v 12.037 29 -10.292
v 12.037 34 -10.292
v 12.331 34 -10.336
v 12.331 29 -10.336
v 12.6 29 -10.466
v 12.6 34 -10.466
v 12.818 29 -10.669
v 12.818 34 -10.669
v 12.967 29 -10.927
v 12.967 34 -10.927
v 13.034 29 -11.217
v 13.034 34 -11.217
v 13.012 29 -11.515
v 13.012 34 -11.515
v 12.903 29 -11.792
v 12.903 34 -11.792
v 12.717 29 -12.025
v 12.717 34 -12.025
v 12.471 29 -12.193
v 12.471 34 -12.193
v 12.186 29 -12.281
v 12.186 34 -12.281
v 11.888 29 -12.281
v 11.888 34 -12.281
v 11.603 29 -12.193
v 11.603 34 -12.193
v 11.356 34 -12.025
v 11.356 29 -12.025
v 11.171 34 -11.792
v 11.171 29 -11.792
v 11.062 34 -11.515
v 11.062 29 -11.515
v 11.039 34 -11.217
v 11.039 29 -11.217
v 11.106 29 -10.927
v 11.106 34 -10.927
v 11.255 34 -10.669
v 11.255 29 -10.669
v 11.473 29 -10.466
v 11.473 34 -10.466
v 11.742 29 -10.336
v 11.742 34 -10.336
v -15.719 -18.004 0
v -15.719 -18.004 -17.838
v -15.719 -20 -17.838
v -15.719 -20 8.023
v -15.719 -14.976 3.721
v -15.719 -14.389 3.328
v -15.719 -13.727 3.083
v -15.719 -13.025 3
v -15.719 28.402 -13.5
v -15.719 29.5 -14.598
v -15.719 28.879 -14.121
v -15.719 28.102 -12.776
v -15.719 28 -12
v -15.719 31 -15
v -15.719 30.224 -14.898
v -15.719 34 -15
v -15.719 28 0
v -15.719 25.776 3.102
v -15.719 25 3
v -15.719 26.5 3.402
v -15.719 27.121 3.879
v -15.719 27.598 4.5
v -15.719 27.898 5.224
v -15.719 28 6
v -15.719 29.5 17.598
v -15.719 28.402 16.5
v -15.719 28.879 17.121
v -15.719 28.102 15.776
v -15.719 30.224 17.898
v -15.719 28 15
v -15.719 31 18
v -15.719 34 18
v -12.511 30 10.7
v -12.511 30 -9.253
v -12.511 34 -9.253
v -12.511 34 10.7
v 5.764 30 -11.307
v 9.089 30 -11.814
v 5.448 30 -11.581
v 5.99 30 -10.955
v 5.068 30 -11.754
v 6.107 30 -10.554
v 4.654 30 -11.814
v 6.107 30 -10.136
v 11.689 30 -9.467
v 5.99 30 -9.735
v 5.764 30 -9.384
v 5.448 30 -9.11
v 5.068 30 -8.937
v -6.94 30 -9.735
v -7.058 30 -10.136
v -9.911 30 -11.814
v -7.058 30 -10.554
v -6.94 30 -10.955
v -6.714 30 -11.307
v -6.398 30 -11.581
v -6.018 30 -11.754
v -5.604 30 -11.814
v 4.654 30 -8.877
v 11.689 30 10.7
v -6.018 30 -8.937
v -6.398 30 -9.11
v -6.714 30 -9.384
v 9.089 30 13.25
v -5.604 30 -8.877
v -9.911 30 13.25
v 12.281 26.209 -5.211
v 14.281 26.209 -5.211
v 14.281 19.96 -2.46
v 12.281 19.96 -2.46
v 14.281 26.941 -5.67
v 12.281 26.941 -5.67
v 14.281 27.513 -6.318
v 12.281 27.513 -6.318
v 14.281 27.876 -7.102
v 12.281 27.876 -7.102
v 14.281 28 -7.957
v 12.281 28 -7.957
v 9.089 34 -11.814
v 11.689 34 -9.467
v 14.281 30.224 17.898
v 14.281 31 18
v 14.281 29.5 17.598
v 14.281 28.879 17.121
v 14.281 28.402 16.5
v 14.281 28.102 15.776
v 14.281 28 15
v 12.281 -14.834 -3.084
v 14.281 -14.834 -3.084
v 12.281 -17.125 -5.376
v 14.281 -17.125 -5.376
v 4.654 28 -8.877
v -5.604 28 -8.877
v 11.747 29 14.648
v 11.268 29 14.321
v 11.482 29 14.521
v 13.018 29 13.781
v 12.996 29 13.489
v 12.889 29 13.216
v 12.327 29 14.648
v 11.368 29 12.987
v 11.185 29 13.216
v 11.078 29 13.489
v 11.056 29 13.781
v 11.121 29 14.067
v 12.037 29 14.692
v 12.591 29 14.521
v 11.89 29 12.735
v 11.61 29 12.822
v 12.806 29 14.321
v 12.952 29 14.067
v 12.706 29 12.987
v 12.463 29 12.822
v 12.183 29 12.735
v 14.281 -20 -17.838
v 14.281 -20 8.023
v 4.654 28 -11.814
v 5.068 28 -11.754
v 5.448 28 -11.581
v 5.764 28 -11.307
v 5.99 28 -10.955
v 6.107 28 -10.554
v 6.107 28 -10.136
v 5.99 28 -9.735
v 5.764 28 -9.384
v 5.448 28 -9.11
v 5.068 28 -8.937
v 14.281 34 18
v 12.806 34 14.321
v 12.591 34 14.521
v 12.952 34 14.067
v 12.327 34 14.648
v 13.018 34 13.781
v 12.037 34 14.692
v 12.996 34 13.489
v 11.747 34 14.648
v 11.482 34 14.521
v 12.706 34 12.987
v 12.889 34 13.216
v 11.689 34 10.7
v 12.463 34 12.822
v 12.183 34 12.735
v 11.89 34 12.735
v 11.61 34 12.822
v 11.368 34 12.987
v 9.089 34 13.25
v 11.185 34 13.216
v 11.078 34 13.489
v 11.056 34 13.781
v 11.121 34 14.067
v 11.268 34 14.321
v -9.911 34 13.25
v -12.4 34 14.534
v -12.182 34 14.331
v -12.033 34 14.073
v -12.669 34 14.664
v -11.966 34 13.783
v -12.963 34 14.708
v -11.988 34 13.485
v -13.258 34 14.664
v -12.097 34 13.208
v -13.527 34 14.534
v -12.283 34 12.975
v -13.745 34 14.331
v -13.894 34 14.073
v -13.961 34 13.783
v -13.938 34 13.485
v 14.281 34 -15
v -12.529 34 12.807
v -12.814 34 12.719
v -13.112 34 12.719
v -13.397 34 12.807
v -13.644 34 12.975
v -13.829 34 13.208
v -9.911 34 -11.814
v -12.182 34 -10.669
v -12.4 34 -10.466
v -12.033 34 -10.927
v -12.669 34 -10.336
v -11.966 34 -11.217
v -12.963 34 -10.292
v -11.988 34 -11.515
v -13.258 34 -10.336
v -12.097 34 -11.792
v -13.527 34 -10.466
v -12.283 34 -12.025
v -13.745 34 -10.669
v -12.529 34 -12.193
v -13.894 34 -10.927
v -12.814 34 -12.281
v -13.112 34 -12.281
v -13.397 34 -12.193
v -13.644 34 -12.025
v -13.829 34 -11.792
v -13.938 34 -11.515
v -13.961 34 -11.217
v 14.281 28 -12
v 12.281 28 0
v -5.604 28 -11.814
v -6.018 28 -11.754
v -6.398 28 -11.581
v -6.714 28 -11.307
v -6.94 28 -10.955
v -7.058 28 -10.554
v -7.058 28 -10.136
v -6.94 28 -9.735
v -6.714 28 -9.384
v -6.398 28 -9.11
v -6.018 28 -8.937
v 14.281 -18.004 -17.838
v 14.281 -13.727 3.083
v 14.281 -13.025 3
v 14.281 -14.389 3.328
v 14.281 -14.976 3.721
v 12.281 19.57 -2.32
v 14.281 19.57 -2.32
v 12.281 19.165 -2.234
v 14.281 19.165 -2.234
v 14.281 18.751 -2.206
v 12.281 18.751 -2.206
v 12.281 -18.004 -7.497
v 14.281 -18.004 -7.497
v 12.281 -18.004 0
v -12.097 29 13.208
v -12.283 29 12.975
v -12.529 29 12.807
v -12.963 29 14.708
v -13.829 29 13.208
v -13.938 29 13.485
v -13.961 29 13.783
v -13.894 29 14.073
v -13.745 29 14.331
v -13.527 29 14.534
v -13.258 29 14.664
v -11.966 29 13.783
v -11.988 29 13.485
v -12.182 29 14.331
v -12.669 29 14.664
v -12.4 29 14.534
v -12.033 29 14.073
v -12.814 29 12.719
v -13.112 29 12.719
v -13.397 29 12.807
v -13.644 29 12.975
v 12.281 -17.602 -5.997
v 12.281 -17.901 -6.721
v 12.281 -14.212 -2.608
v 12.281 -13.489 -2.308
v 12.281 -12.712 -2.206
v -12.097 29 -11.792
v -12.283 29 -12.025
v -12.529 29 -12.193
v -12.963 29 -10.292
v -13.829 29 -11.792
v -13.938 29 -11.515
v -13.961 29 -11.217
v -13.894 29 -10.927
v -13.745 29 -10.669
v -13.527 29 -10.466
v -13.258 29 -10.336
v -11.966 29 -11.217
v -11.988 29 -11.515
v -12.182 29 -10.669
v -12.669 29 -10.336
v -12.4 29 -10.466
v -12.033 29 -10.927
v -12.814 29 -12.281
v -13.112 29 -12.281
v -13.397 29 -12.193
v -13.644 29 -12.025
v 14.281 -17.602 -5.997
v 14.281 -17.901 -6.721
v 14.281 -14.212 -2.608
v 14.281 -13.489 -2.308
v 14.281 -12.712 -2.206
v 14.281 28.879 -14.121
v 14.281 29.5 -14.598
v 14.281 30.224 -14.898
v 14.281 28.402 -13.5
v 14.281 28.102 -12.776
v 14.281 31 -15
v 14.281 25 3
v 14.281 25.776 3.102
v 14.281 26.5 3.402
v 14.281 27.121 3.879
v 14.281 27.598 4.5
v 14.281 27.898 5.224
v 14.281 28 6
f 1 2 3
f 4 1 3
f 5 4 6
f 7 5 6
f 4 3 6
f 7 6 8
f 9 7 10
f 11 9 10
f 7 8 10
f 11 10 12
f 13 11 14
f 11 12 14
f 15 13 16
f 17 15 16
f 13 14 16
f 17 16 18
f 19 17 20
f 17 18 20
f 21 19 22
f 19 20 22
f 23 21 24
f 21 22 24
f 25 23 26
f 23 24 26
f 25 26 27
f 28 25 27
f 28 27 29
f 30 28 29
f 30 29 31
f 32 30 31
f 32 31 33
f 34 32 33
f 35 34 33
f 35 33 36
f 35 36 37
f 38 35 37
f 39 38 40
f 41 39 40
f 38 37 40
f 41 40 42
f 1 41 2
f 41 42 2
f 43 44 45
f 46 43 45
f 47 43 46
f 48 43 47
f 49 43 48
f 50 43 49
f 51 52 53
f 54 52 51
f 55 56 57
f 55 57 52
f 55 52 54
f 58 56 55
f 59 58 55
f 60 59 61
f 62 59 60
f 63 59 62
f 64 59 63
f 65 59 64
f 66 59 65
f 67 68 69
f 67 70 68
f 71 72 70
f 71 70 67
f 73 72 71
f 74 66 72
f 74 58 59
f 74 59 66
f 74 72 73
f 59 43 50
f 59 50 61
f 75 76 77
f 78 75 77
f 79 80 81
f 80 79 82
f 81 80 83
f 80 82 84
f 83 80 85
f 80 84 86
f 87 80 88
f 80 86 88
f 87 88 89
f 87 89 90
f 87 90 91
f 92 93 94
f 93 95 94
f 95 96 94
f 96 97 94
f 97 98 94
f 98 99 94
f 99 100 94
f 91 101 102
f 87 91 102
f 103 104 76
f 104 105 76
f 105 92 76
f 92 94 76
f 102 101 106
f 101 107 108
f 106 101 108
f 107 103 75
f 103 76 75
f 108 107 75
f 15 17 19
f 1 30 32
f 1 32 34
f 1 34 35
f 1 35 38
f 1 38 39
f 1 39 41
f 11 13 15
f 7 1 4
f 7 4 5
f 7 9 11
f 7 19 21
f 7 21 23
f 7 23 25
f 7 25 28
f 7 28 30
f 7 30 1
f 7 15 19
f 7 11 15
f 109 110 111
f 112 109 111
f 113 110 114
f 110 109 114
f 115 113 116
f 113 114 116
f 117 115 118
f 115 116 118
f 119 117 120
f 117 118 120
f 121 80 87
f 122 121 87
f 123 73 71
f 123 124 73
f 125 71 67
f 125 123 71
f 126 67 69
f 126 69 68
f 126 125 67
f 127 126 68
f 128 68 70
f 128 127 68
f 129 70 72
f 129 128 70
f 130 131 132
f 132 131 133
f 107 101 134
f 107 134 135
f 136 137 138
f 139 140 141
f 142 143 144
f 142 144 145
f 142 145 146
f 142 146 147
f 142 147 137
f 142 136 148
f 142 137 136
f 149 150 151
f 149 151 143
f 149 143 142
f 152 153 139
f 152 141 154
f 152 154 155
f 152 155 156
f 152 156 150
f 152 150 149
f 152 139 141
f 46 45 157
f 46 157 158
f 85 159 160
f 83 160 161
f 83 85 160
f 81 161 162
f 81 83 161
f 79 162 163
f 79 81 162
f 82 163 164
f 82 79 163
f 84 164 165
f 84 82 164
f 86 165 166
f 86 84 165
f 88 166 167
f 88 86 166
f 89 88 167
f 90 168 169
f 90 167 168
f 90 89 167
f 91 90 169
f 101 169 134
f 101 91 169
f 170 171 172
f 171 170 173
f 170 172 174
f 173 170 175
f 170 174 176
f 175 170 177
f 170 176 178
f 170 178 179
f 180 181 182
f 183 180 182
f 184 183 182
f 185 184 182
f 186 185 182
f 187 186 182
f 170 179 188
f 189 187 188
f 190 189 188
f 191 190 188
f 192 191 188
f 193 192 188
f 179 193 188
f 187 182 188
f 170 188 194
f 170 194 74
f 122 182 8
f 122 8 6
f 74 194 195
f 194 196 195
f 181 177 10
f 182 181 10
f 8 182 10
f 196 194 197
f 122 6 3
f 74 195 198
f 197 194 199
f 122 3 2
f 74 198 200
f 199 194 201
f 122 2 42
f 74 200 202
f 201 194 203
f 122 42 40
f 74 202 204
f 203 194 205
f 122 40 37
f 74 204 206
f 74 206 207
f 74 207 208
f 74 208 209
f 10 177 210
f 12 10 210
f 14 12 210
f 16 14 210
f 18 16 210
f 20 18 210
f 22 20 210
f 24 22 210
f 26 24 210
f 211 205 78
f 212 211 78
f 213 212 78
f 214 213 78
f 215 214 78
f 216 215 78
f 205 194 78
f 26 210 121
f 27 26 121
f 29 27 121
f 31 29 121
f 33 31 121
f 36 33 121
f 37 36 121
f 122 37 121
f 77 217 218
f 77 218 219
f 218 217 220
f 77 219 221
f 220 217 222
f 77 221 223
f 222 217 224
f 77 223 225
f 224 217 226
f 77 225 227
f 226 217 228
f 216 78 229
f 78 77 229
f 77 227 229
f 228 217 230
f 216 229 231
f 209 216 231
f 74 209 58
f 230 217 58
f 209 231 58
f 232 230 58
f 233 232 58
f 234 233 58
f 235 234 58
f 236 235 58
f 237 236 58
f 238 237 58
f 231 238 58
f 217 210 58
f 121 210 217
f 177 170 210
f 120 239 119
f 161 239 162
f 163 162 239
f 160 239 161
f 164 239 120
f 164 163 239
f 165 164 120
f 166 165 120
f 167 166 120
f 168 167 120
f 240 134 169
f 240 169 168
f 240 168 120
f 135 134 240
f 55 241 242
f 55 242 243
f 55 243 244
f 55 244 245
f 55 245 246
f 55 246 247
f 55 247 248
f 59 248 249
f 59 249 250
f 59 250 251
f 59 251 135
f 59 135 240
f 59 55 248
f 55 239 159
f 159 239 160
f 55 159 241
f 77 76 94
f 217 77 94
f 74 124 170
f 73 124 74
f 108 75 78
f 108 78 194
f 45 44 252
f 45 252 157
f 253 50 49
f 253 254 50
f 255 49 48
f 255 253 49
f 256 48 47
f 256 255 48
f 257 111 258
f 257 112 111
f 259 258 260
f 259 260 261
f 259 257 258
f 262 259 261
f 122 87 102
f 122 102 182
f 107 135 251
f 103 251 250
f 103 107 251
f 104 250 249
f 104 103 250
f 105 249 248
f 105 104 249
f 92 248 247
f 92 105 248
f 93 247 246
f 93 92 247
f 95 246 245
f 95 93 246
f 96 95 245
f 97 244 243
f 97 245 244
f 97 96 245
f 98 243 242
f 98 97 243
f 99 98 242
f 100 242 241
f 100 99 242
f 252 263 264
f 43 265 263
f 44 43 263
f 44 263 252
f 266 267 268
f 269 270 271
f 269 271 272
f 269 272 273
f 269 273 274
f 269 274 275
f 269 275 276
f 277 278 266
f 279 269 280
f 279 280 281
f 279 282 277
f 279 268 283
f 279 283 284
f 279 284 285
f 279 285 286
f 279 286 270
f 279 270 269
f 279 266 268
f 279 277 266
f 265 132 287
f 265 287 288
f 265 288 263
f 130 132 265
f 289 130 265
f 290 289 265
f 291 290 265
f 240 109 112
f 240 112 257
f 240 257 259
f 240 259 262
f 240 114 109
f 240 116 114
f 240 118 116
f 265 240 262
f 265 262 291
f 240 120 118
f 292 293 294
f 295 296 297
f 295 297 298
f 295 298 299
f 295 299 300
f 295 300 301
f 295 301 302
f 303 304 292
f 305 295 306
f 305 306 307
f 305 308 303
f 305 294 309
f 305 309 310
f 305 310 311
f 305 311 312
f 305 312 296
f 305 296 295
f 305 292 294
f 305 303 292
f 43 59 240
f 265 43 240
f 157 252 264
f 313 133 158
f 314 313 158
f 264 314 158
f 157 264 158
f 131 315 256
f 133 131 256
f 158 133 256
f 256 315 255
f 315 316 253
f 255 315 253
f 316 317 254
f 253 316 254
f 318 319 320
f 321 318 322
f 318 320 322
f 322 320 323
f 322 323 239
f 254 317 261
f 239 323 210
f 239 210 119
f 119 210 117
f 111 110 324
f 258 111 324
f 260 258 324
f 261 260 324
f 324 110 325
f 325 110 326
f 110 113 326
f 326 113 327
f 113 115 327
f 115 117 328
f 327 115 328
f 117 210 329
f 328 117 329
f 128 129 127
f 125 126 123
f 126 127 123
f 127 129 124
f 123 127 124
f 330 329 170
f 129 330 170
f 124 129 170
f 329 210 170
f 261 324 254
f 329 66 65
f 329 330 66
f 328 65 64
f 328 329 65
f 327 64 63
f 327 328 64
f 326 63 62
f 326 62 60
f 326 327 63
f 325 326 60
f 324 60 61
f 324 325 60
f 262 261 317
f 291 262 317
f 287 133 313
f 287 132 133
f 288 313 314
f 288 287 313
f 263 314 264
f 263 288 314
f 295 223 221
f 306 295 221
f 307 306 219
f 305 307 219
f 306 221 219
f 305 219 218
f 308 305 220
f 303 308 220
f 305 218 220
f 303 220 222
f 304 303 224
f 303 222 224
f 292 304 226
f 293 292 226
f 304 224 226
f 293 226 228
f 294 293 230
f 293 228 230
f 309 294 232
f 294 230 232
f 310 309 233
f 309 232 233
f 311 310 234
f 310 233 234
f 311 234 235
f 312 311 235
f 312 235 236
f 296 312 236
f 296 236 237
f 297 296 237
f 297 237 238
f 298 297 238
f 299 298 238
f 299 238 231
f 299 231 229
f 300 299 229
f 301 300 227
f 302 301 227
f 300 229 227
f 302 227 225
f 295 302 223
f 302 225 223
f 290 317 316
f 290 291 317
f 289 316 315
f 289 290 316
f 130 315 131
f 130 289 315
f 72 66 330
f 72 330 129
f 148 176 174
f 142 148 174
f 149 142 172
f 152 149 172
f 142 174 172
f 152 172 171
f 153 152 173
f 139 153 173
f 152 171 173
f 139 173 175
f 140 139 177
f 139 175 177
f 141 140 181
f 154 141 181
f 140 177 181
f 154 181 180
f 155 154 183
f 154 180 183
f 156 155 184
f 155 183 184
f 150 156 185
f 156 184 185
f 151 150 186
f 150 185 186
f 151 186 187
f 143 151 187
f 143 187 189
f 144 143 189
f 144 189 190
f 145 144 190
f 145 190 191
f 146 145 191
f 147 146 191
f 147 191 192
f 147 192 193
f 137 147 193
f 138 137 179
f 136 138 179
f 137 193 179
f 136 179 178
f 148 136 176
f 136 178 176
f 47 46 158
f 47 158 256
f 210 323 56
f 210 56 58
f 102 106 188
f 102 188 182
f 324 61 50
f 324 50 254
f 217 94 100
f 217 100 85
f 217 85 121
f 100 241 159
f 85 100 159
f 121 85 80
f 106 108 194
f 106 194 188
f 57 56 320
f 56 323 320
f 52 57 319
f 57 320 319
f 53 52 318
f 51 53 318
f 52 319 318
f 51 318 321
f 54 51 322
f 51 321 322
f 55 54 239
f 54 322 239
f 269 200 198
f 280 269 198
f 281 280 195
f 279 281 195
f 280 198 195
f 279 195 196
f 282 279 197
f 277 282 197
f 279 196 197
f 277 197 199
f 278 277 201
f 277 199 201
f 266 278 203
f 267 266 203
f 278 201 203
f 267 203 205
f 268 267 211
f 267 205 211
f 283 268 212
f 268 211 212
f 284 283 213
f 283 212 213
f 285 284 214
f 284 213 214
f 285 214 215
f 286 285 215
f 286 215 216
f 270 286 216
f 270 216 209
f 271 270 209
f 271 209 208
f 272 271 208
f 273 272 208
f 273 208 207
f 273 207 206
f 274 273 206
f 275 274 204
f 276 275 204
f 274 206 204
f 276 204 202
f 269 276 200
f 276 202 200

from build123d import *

# Parameters (mm, degrees)
SKETCH_1_W           = 30
SKETCH_1_H           = 50
EXTRUDE_1_DEPTH      = 3
EXTRUDE_2_DEPTH      = 30
EXTRUDE_3_DEPTH      = 15
EXTRUDE_3_DEPTH_BACK = 18
SKETCH_3_W           = 3.207439814
SKETCH_3_H           = 4
SKETCH_3_W_2         = 2.592560186
SKETCH_4_W           = 33
SKETCH_4_H           = 2
EXTRUDE_4_DEPTH      = 30
EXTRUDE_5_DEPTH      = 4
CUT_EXTRUDE_1_DEPTH  = 5
SKETCH_7_R           = 1
SKETCH_7_R_2         = 0.983708166
CUT_EXTRUDE_2_DEPTH  = 5
FILLET_1_R           = 3
FILLET_2_R           = 3
EXTRUDE_6_DEPTH      = 2
FILLET_3_R           = 3
FILLET_4_R           = 3


with BuildPart() as part:
    # 草图1 → 凸台-拉伸1 (new body)
    with BuildSketch(Plane.XY):
        with Locations((-0.718788486, 5)):
            Rectangle(SKETCH_1_W, SKETCH_1_H)
    extrude(amount=EXTRUDE_1_DEPTH)

    # 草图2 → 凸台-拉伸2 (add)
    with BuildSketch(Plane.ZY.offset(15.718788486)):
        Polygon((0, -18.003627417), (-17.838069007, -18.003627417), (-17.838069007, -20), (8.023023193, -20), (3, -14.134137312), align=None)
    extrude(amount=-EXTRUDE_2_DEPTH)

    # 草图3 → 凸台-拉伸3 (add, two sides: drawn at the far end of the back side and taken through both)
    with BuildSketch(Plane.XY.offset(3).offset(-EXTRUDE_3_DEPTH_BACK)):
        with Locations((-14.115068579, 32)):
            Rectangle(SKETCH_3_W, SKETCH_3_H)
        with Locations((12.984931421, 32)):
            Rectangle(SKETCH_3_W_2, SKETCH_3_H)
    extrude(amount=EXTRUDE_3_DEPTH + EXTRUDE_3_DEPTH_BACK)

    # 草图4 → 凸台-拉伸4 (add)
    with BuildSketch(Plane.ZY.offset(15.718788486)):
        with Locations((1.5, 29)):
            Rectangle(SKETCH_4_W, SKETCH_4_H)
    extrude(amount=-EXTRUDE_4_DEPTH)

    # 草图5 → 凸台-拉伸5 (add)
    with BuildSketch(Plane(origin=(0, 30, 0), x_dir=(1, 0, 0), z_dir=(0, 1, 0))):
        Polygon((11.688651328, -18), (-12.511348672, -18), (-12.511348672, -10.700066454), (-9.911348672, -13.250066454), (9.088651328, -13.250066454), (11.688651328, -10.700066454), align=None)
        Polygon((-12.511348672, 15), (-12.511348672, 9.252839713), (-9.911348672, 11.813752042), (9.088651328, 11.813752042), (11.688651328, 9.466986357), (11.688651328, 12.549933546), (11.688651328, 15), align=None)
    extrude(amount=EXTRUDE_5_DEPTH)

    # 草图6 → 切除-拉伸1 (cut)
    with BuildSketch(Plane(origin=(0, 30, 0), x_dir=(1, 0, 0), z_dir=(0, 1, 0))):
        with BuildLine():
            Line((4.654057322, 8.877034891), (-5.604351552, 8.877034891))
            ThreePointArc((-5.604351552, 8.877034891), (-7.072710128, 10.345393466), (-5.604351552, 11.813752042))
            Line((-5.604351552, 11.813752042), (4.654057322, 11.813752042))
            ThreePointArc((4.654057322, 11.813752042), (6.122415898, 10.345393466), (4.654057322, 8.877034891))
        make_face()
    extrude(amount=-CUT_EXTRUDE_1_DEPTH, mode=Mode.SUBTRACT)

    # 草图7 → 切除-拉伸2 (cut)
    with BuildSketch(Plane(origin=(0, 34, 0), x_dir=(1, 0, 0), z_dir=(0, 1, 0))):
        with Locations(Location((-12.963376937, -13.707969551, 0), (0, 0, 270))):
            Circle(SKETCH_7_R)
        with Locations(Location((12.036623063, -13.707969551, 0), (0, 0, 270))):
            Circle(SKETCH_7_R_2)
        with Locations(Location((12.036623063, 11.292030449, 0), (0, 0, 270))):
            Circle(SKETCH_7_R)
        with Locations(Location((-12.963376937, 11.292030449, 0), (0, 0, 270))):
            Circle(SKETCH_7_R)
    extrude(amount=-CUT_EXTRUDE_2_DEPTH, mode=Mode.SUBTRACT)

    # 圆角1
    fillet_1_edges = [part.edges().sort_by_distance(p)[0] for p in [
        (-0.718788486, 28, -15),
        (-0.718788486, 28, 18),
    ]]
    fillet(fillet_1_edges, radius=FILLET_1_R)

    # 圆角2
    fillet_2_edges = [part.edges().sort_by_distance(p)[0] for p in [
        (-0.718788486, 28, 3),
    ]]
    fillet(fillet_2_edges, radius=FILLET_2_R)

    # 草图11 → 凸台-拉伸6 (add)
    with BuildSketch(Plane(origin=(14.281211514, 0, 0), x_dir=(0, 0, -1), z_dir=(1, 0, 0))):
        Polygon((6, 28), (2.205685264, 19.382557308), (2.205685264, -13.954926573), (6.254386108, -18.003627417), (0, -18.003627417), (0, 28), align=None)
    extrude(amount=-EXTRUDE_6_DEPTH)

    # 圆角3
    fillet_3_edges = [part.edges().sort_by_distance(p)[0] for p in [
        (13.281211514, 28, -6),
        (13.281211514, 19.382557308, -2.205685264),
        (13.281211514, -13.954926573, -2.205685264),
        (13.281211514, -18.003627417, -6.254386108),
    ]]
    fillet(fillet_3_edges, radius=FILLET_3_R)

    # 圆角4
    fillet_4_edges = [part.edges().sort_by_distance(p)[0] for p in [
        (-0.718788486, -14.134137312, 3),
    ]]
    fillet(fillet_4_edges, radius=FILLET_4_R)


solid = part.part
